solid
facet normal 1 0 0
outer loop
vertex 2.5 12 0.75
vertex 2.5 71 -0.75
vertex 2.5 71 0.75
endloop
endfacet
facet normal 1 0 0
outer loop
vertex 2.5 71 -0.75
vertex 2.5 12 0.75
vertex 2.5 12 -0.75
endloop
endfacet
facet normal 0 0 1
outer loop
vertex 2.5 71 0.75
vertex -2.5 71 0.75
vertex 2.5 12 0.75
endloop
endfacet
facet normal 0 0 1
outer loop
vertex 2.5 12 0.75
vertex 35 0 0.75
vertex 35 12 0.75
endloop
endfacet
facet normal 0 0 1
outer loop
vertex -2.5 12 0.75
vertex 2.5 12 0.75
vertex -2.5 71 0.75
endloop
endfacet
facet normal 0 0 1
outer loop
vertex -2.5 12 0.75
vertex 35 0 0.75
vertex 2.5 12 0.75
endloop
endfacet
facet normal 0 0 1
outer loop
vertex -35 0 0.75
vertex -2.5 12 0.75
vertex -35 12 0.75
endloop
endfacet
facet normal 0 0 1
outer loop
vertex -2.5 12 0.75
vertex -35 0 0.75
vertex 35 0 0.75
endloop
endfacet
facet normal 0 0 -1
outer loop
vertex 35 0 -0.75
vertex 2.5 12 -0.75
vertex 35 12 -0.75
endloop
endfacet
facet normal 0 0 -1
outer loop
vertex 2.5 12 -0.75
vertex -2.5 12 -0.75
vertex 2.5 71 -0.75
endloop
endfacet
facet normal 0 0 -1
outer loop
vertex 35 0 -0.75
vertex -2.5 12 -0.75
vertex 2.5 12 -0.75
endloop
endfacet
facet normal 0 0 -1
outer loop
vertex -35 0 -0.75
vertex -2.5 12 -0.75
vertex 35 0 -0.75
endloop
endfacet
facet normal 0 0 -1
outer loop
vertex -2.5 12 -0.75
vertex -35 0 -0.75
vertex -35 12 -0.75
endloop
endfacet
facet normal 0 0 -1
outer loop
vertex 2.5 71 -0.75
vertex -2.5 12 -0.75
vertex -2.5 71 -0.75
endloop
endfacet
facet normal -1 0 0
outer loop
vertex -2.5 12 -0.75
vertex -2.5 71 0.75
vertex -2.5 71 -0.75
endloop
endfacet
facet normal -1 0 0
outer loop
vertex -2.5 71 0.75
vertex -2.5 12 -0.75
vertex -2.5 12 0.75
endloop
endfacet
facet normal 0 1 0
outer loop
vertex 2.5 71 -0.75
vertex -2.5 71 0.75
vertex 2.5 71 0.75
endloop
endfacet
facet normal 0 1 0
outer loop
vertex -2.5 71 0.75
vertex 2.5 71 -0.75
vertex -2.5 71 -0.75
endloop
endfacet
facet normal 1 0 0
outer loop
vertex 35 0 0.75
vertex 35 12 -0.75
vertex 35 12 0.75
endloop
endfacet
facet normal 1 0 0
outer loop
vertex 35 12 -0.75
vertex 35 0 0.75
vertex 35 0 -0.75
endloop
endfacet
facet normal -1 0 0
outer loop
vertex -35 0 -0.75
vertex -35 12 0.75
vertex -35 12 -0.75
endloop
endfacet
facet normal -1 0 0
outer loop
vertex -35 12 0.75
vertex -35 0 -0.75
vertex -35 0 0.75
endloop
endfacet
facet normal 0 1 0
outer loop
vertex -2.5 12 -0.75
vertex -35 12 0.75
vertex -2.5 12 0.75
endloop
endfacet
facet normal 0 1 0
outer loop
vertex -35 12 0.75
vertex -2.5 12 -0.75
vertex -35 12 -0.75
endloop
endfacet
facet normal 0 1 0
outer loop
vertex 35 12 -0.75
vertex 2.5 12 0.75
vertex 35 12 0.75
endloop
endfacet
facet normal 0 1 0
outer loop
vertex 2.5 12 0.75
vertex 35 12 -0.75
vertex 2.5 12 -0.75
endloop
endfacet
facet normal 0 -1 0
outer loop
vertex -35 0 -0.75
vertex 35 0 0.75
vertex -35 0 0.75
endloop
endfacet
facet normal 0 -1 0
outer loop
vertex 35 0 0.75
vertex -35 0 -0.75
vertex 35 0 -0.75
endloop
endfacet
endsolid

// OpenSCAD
// Dimensions for the 10-well agarose gel comb
// All units in millimetres

// Overall Geometry
plate_thickness = 1.5;   // Thickness of the flat plate (Z)
spine_length = 70;       // Length of the spine (X)
spine_width = 12;        // Width of the spine (Y)

// Tooth Geometry
tooth_width = 5.0;       // Width of a single tooth (X)
tooth_length = 12;       // Length of a single tooth (Y)
tooth_gap = 1.5;         // Gap between neighbouring teeth (Y)

// Positioning
num_teeth = 10;          // Number of teeth on the comb
tooth_offset = 0.5;      // Offset of the first tooth from the spine edge (Y)

// Rendering
$fn = 64;               // High resolution for curved surfaces

// Main Body
module gel_comb() {
    union() {
        // The Spine (Back bar)
        translate([0, spine_width / 2, 0])
            cube([spine_length, spine_width, plate_thickness], center = true);

        // The Teeth
        // Calculate total width occupied by teeth and gaps
        total_teeth_width = num_teeth * tooth_width;
        total_gaps_width = (num_teeth - 1) * tooth_gap;
        total_row_width = total_teeth_width + total_gaps_width;

        // Calculate starting Y position to center the row of teeth
        // The row starts at the edge of the spine (Y = spine_width/2)
        // and extends into -Y.
        start_y = (spine_width / 2) + tooth_offset;

        for (i = [0 : num_teeth - 1]) {
            // Calculate Y position for each tooth
            // The first tooth is at start_y, the next is start_y + tooth_width + tooth_gap, etc.
            current_y = start_y + i * (tooth_width + tooth_gap);

            translate([0, current_y, 0])
                cube([tooth_width, tooth_length, plate_thickness], center = true);
        }
    }
}

// Render the part
gel_comb();
